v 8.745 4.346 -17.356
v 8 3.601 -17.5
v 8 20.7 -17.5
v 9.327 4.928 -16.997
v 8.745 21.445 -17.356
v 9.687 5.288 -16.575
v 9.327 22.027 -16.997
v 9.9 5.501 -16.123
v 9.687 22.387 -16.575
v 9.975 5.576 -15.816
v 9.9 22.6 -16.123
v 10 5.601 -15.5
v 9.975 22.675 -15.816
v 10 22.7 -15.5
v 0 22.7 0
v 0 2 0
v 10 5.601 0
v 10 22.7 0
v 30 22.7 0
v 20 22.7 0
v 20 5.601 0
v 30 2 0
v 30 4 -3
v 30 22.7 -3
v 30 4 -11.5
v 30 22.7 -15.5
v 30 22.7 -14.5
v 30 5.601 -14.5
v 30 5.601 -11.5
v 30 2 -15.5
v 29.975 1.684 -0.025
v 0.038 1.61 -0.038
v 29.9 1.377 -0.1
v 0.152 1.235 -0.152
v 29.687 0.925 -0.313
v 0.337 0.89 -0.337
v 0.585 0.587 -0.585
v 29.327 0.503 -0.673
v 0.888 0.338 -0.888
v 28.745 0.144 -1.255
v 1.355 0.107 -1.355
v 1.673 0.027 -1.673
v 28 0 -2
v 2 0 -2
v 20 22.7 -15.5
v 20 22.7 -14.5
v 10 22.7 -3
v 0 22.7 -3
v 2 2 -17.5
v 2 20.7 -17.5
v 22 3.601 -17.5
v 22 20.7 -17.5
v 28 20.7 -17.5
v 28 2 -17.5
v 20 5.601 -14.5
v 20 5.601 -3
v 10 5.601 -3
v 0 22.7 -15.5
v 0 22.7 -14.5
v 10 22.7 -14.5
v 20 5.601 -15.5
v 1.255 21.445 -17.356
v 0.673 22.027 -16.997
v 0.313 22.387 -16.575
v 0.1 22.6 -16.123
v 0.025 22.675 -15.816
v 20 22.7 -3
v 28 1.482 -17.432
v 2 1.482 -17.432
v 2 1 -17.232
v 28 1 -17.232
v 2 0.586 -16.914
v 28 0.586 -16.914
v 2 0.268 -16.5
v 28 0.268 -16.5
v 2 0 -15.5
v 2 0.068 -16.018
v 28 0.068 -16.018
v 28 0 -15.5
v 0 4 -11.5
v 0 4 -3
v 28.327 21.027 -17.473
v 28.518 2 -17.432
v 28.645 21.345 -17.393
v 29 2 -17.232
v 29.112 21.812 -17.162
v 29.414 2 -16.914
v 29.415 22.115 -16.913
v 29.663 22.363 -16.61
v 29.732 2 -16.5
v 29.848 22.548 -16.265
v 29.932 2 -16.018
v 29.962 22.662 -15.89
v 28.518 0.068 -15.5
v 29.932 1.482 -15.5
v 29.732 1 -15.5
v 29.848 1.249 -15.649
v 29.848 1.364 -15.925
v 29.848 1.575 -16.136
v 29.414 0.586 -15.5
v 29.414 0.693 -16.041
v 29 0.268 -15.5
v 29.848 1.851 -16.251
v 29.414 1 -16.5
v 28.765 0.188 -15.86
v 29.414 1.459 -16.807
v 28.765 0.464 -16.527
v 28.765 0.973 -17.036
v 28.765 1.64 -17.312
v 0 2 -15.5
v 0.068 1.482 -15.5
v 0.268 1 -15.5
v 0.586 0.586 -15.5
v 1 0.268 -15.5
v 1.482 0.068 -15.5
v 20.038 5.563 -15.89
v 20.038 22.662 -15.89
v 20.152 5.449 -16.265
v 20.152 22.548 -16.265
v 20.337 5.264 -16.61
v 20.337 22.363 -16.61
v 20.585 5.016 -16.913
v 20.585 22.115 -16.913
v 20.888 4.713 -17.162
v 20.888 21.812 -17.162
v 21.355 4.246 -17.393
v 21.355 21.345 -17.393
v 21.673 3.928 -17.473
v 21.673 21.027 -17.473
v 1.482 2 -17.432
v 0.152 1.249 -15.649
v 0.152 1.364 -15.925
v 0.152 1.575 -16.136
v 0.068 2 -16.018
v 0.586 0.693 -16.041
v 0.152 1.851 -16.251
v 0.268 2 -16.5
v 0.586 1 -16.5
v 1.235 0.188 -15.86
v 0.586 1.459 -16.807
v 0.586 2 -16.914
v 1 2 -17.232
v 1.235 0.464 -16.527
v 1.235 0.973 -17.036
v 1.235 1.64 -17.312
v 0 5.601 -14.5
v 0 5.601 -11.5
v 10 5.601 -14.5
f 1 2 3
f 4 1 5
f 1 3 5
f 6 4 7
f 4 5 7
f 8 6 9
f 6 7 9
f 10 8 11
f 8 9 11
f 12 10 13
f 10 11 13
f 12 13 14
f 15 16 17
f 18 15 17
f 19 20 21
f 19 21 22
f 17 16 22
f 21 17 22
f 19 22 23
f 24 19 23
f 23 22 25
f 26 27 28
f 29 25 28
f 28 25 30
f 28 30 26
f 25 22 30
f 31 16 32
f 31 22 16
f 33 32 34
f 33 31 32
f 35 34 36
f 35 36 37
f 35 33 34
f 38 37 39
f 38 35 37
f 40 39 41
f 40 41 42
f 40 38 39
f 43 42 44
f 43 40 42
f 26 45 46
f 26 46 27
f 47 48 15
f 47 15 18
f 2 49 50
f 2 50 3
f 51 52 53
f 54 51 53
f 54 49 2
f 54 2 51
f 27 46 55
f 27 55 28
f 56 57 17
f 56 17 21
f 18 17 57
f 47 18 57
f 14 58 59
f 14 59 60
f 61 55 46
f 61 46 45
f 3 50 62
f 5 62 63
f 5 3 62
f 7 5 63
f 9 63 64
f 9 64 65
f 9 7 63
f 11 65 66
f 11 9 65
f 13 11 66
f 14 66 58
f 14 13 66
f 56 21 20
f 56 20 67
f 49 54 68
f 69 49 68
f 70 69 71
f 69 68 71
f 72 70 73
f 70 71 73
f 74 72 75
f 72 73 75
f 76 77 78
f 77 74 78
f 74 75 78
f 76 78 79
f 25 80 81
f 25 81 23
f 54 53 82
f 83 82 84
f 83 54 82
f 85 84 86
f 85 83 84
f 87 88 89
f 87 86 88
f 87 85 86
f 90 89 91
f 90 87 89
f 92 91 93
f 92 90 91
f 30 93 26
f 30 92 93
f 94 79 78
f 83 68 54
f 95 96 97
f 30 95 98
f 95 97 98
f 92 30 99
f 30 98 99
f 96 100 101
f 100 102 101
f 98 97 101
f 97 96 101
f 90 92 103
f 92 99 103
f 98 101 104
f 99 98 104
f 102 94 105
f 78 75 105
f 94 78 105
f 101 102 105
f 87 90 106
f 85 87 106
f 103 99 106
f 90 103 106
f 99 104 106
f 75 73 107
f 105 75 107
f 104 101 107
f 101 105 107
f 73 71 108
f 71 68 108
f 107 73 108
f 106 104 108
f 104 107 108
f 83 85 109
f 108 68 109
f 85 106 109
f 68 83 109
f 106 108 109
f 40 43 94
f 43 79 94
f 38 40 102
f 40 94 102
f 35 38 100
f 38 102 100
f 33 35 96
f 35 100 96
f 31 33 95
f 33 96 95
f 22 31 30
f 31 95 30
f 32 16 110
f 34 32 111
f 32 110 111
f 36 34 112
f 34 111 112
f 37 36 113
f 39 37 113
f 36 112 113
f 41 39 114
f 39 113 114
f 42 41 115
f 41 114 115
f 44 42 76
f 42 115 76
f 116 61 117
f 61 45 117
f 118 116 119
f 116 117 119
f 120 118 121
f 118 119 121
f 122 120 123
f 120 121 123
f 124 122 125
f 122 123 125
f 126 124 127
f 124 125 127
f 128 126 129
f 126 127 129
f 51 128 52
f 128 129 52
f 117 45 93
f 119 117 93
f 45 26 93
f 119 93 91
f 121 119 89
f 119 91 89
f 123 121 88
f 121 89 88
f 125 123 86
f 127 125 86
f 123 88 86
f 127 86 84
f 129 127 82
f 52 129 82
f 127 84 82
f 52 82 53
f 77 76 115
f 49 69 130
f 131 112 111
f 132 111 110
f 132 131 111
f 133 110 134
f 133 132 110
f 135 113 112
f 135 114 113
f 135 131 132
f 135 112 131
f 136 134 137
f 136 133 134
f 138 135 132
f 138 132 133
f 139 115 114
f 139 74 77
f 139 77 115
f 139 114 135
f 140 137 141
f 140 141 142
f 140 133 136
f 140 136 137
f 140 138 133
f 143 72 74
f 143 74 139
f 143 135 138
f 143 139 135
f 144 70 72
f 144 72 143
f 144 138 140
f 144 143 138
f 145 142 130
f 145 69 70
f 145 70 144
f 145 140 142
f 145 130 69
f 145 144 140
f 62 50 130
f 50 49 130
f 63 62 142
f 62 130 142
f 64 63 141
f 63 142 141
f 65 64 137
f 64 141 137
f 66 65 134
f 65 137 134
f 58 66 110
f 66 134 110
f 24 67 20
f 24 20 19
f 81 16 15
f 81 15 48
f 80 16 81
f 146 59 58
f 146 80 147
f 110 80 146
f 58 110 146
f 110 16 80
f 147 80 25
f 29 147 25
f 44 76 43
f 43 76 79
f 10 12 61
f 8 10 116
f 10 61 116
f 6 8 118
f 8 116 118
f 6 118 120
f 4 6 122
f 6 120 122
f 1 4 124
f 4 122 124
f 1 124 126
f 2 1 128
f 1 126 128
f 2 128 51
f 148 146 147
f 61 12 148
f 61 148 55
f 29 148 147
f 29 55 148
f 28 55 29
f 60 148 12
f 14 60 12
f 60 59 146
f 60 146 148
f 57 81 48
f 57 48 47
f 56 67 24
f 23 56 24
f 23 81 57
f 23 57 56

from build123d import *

# Parameters (mm, degrees)
SKETCH1_W           = 30
SKETCH1_H           = 17.5
BOSS_EXTRUDE1_DEPTH = 4
SKETCH2_W           = 30
SKETCH2_H           = 6
BOSS_EXTRUDE2_DEPTH = 1.601
SKETCH3_W           = 10
SKETCH3_H           = 3
BOSS_EXTRUDE3_DEPTH = 18.7
SKETCH4_W           = 10
SKETCH4_H           = 3
BOSS_EXTRUDE4_DEPTH = 17.099
SKETCH5_W           = 10
SKETCH5_H           = 3
BOSS_EXTRUDE5_DEPTH = 1.601
FILLET1_R           = 2


with BuildPart() as part:
    # Sketch1 → Boss-Extrude1 (new body)
    with BuildSketch(Plane(origin=(0, 0, 0), x_dir=(1, 0, 0), z_dir=(0, 1, 0))):
        with Locations((15, 8.75)):
            Rectangle(SKETCH1_W, SKETCH1_H)
    extrude(amount=BOSS_EXTRUDE1_DEPTH)

    # Sketch2 → Boss-Extrude2 (add)
    with BuildSketch(Plane(origin=(0, 4, 0), x_dir=(1, 0, 0), z_dir=(0, 1, 0))):
        with Locations((15, 14.5)):
            Rectangle(SKETCH2_W, SKETCH2_H)
    extrude(amount=BOSS_EXTRUDE2_DEPTH)

    # Sketch3 → Boss-Extrude3 (add)
    with BuildSketch(Plane(origin=(0, 4, 0), x_dir=(1, 0, 0), z_dir=(0, 1, 0))):
        with Locations((5, 1.5)):
            Rectangle(SKETCH3_W, SKETCH3_H)
        with Locations((25, 1.5)):
            Rectangle(SKETCH3_W, SKETCH3_H)
    extrude(amount=BOSS_EXTRUDE3_DEPTH)

    # Sketch4 → Boss-Extrude4 (add)
    with BuildSketch(Plane(origin=(0, 5.601, 0), x_dir=(1, 0, 0), z_dir=(0, 1, 0))):
        with Locations((5, 16)):
            Rectangle(SKETCH4_W, SKETCH4_H)
        with Locations((25, 16)):
            Rectangle(SKETCH4_W, SKETCH4_H)
    extrude(amount=BOSS_EXTRUDE4_DEPTH)

    # Sketch5 → Boss-Extrude5 (add)
    with BuildSketch(Plane(origin=(0, 4, 0), x_dir=(1, 0, 0), z_dir=(0, 1, 0))):
        with Locations((15, 1.5)):
            Rectangle(SKETCH5_W, SKETCH5_H)
    extrude(amount=BOSS_EXTRUDE5_DEPTH)

    # Fillet1
    fillet1_edges = [part.edges().sort_by_distance(p)[0] for p in [
        (15, 0, -17.5),
        (30, 0, -8.75),
        (15, 0, 0),
        (10, 14.1505, -17.5),
        (5, 22.7, -17.5),
        (0, 0, -8.75),
        (15, 5.601, -17.5),
        (20, 14.1505, -17.5),
        (25, 22.7, -17.5),
        (0, 11.35, -17.5),
        (30, 11.35, -17.5),
    ]]
    fillet(fillet1_edges, radius=FILLET1_R)


solid = part.part
